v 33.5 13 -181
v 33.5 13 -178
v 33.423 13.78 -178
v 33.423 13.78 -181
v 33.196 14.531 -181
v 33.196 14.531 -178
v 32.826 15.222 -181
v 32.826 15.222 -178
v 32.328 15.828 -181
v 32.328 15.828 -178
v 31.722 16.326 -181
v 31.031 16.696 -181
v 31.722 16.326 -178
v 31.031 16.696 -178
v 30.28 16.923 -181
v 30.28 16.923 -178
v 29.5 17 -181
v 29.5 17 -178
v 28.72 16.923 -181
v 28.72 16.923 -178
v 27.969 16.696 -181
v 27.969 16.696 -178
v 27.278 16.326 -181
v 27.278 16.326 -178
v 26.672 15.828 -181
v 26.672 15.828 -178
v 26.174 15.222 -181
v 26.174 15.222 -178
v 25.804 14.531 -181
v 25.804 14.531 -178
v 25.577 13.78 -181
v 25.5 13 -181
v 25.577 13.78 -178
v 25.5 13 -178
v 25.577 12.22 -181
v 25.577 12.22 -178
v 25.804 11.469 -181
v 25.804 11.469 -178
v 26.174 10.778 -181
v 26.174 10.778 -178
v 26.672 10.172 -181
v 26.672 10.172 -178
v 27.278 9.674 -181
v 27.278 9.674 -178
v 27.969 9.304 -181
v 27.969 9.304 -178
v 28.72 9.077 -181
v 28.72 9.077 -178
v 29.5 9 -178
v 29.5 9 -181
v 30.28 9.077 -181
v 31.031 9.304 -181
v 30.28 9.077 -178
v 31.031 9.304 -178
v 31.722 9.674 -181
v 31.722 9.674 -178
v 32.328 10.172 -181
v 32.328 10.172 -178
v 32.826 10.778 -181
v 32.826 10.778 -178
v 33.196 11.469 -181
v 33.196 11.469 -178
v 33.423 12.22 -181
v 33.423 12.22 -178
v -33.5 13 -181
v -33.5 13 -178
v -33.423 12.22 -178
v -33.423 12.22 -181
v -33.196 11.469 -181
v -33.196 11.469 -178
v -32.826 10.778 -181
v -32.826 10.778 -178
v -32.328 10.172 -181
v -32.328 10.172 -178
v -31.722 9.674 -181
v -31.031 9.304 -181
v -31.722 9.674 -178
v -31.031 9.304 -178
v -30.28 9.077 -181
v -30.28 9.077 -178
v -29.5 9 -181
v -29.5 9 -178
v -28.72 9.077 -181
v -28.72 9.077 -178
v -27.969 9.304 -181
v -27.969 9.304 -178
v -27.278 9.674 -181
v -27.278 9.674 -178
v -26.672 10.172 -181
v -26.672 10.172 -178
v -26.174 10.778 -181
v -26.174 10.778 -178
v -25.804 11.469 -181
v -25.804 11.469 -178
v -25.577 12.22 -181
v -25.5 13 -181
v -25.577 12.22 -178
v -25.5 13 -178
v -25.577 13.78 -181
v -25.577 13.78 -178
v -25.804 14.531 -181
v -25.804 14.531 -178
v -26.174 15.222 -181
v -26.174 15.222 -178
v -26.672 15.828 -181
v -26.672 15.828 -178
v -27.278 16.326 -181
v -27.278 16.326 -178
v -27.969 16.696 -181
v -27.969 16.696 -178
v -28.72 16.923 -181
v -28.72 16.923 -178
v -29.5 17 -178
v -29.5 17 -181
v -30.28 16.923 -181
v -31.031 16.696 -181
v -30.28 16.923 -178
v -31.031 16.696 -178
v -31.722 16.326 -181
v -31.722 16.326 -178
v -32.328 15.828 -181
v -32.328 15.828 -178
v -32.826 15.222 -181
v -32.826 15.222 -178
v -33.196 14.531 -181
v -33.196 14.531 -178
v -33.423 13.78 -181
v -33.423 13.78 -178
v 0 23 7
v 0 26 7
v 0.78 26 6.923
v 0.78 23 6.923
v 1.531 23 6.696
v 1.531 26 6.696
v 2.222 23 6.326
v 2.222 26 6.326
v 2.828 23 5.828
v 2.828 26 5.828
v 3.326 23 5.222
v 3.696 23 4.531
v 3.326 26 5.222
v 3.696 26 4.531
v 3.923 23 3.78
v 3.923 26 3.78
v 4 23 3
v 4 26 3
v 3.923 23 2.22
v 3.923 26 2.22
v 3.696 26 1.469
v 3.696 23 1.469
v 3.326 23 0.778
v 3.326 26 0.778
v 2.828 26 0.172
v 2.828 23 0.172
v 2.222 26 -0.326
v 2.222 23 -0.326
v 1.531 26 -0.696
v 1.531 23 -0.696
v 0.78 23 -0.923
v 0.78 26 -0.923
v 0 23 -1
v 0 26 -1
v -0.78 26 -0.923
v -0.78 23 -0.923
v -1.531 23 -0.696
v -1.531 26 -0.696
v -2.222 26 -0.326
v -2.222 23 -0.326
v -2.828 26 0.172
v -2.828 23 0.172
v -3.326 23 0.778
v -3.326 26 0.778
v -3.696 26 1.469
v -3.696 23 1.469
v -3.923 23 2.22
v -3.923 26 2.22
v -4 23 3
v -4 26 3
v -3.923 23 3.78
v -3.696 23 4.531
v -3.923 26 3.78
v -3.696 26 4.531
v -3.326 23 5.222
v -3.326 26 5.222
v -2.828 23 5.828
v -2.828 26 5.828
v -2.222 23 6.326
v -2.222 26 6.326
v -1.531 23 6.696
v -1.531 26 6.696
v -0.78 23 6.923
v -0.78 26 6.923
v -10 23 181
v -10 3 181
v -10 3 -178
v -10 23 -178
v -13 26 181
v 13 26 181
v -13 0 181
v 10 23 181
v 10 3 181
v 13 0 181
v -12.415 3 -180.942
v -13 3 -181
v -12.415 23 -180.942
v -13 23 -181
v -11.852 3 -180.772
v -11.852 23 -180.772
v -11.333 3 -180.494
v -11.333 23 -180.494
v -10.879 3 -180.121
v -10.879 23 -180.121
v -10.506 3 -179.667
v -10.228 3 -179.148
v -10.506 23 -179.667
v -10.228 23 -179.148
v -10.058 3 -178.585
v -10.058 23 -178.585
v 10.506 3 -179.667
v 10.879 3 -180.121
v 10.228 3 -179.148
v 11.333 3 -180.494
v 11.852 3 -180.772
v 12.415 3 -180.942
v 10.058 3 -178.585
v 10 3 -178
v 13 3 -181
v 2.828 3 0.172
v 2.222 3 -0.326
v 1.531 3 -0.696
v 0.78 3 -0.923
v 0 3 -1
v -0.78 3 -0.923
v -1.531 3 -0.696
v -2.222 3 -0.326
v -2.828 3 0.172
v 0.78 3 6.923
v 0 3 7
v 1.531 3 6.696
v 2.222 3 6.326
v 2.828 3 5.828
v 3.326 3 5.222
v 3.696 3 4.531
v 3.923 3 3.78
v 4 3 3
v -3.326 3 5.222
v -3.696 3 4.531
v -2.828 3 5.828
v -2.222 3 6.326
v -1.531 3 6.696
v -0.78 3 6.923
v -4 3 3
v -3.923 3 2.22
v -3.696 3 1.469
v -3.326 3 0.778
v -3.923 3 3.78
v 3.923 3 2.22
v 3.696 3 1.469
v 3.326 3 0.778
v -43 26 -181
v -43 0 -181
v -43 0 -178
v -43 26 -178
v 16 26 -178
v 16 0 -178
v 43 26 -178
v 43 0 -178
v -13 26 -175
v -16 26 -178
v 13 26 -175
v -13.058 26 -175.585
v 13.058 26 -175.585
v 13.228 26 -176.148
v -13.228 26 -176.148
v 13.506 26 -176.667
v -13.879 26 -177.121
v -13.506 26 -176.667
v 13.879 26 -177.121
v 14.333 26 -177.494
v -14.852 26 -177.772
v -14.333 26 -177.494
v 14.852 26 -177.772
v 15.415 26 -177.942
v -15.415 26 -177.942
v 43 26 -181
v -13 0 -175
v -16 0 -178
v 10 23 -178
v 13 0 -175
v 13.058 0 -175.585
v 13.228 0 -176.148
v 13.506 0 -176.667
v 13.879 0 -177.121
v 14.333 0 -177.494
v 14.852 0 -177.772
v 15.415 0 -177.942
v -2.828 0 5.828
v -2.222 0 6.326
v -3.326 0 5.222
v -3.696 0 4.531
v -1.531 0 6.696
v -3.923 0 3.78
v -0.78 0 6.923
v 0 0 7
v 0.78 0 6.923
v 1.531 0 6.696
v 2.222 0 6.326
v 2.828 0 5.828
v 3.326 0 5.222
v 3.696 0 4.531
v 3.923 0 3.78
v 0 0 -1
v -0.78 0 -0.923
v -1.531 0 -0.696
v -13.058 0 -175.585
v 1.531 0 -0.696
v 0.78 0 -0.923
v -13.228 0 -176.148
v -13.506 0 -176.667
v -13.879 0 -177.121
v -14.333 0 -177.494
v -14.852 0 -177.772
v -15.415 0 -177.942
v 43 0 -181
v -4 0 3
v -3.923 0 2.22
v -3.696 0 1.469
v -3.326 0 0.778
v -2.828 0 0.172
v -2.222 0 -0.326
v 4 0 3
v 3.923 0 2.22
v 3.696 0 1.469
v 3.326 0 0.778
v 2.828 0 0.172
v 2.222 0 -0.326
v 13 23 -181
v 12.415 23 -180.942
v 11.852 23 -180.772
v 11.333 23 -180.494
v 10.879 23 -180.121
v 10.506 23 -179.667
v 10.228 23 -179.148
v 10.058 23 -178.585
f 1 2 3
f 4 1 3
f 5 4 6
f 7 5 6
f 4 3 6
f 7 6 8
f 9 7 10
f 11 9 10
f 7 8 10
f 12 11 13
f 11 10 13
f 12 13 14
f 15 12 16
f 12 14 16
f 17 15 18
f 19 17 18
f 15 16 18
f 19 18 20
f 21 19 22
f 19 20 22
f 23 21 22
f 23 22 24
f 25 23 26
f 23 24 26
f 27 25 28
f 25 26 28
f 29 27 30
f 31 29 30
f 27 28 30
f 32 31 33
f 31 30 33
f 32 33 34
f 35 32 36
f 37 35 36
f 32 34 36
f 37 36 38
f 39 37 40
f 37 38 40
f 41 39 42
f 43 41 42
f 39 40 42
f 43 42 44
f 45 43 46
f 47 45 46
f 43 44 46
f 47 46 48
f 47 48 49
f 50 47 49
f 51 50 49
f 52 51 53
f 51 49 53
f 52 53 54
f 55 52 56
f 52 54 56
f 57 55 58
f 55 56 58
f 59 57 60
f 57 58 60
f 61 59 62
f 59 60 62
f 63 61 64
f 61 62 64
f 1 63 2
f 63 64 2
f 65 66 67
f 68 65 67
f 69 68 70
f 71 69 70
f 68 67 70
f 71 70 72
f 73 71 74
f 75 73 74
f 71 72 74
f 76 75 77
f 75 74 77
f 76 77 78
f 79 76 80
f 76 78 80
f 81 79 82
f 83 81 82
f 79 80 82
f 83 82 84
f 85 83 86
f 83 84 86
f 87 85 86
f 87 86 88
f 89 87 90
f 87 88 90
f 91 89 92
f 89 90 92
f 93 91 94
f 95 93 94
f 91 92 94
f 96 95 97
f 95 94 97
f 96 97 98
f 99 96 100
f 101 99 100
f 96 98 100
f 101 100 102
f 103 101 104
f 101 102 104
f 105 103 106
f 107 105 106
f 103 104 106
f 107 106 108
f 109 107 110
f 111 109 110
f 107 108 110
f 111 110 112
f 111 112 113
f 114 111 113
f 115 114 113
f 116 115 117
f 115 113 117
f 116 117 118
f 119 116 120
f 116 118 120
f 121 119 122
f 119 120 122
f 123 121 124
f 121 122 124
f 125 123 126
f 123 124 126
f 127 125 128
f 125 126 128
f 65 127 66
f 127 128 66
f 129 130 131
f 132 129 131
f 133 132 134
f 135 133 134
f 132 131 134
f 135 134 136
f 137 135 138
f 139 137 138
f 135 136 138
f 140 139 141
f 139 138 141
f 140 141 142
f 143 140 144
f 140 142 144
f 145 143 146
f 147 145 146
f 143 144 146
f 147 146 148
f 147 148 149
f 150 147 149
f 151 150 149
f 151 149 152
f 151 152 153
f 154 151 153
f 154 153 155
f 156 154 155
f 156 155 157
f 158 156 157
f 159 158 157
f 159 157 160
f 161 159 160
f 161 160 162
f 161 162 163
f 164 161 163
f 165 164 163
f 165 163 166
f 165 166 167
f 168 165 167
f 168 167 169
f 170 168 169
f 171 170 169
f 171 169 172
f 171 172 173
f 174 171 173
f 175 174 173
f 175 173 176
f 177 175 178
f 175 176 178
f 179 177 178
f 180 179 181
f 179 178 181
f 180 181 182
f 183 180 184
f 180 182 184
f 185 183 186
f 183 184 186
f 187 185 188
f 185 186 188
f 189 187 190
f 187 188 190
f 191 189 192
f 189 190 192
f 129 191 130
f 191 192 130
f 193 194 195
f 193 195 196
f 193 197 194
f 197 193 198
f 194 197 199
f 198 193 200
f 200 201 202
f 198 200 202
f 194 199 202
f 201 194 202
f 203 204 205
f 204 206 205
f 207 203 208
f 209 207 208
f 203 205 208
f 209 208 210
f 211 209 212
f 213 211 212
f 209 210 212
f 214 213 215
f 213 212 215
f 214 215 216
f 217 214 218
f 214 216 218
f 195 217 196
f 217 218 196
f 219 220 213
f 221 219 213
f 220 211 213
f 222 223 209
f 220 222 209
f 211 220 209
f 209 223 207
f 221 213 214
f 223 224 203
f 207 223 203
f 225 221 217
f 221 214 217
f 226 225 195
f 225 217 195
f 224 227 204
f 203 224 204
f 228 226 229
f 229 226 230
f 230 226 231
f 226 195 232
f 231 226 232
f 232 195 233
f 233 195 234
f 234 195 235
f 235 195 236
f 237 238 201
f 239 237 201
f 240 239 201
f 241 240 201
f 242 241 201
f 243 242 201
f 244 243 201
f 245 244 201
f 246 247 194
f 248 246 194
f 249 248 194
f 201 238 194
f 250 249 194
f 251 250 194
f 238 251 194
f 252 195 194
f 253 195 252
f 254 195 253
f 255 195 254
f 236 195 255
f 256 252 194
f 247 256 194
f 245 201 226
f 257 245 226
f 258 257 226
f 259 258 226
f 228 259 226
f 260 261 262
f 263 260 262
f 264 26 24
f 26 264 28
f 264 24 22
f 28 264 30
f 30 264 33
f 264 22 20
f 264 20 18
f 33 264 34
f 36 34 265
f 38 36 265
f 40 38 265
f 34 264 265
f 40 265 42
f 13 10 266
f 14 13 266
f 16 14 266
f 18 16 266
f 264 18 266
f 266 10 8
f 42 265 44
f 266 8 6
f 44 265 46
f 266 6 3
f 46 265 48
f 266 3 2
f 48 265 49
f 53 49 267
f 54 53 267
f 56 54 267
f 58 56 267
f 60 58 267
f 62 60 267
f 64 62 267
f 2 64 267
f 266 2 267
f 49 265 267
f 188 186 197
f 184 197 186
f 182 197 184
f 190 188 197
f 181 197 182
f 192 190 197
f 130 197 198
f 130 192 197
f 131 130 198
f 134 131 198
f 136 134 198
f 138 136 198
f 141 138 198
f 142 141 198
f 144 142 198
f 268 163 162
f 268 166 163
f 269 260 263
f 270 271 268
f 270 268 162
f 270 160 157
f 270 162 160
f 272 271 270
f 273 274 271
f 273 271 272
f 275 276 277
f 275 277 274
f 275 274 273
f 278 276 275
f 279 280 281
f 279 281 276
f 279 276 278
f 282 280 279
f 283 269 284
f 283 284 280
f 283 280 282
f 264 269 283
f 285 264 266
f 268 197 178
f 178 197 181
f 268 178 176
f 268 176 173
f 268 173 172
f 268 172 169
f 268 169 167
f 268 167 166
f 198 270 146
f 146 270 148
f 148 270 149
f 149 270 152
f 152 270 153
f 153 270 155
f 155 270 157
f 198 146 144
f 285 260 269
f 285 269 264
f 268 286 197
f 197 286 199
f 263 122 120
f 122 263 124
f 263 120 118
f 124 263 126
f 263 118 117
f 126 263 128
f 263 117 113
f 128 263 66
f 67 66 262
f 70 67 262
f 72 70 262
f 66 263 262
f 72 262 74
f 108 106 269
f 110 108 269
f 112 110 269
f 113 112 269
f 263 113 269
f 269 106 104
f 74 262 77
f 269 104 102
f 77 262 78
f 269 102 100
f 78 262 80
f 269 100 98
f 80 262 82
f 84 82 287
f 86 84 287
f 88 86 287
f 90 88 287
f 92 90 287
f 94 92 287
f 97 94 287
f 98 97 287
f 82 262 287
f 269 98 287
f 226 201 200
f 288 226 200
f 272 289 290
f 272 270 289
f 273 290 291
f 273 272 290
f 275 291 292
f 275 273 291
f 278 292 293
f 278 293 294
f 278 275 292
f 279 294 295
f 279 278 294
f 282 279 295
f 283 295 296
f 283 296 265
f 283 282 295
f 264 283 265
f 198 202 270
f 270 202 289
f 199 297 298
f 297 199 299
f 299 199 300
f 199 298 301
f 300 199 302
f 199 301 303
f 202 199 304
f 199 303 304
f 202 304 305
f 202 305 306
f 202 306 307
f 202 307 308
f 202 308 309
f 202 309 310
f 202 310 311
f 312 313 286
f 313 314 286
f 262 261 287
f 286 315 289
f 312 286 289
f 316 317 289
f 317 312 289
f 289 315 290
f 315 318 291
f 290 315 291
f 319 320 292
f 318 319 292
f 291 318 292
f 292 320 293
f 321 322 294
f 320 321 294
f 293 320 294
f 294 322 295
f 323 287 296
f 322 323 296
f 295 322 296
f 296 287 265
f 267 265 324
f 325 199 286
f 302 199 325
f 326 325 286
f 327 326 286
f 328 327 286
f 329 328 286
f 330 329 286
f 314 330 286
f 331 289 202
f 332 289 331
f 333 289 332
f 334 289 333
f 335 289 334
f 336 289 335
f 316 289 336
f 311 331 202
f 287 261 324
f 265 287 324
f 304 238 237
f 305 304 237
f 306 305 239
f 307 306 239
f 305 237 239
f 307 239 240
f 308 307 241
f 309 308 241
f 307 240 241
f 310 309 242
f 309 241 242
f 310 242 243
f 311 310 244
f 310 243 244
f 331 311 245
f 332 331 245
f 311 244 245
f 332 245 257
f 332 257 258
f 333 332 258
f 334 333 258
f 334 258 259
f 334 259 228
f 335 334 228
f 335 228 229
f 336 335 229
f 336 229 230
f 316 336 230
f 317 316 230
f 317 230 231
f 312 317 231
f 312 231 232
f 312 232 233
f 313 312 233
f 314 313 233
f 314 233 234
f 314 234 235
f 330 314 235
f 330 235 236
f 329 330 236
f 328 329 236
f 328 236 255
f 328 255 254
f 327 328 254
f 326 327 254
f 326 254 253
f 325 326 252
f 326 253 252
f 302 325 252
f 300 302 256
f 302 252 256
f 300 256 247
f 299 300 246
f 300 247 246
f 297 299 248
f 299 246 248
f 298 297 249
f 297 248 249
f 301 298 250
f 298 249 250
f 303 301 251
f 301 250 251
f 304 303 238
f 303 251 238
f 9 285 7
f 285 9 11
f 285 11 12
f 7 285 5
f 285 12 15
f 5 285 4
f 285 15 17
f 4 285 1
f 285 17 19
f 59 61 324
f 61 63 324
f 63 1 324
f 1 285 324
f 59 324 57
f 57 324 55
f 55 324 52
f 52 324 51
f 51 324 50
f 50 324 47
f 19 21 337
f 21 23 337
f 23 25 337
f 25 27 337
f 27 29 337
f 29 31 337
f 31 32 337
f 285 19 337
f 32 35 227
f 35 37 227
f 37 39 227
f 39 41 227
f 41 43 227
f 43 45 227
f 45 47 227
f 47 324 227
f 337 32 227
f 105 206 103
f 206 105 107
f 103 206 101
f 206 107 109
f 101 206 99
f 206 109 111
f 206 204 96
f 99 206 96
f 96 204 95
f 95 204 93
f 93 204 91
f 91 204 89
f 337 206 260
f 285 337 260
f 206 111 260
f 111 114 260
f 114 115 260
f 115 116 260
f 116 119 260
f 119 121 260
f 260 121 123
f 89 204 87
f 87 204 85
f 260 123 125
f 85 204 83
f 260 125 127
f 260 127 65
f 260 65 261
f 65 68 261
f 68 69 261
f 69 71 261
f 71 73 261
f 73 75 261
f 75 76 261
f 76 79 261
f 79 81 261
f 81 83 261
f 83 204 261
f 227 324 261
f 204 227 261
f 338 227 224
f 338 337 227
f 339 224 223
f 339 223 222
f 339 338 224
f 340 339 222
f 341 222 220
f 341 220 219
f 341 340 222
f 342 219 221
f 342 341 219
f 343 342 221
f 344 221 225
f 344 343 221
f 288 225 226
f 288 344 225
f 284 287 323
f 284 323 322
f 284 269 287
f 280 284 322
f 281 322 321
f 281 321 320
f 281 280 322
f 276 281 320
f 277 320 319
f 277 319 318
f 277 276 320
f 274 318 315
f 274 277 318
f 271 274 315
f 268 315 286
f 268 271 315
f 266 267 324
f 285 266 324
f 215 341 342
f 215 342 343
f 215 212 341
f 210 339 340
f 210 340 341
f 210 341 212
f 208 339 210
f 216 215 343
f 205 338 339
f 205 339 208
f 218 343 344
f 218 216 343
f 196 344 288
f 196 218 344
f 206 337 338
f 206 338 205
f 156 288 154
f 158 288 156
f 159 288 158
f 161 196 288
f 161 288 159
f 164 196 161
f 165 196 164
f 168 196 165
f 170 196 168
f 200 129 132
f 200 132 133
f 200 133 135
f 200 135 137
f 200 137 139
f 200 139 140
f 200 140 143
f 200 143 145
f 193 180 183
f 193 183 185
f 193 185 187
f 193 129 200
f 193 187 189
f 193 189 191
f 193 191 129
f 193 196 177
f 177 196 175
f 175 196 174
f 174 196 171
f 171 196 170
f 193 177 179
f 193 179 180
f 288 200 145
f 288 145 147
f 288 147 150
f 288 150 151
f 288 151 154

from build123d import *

# Parameters (mm, degrees)
BOSS_EXTRUDE1_DEPTH = 26
SHELL1_START        = -10
SHELL1_OUTLINE_W    = 20
SHELL1_OUTLINE_H    = 362
SHELL1_DEPTH        = 20
FILLET1_R           = 3
SKETCH3_R           = 4
CUT_EXTRUDE1_DEPTH  = 3
SKETCH4_R           = 4
CUT_EXTRUDE2_DEPTH  = 37


# Read off the part's stored shape, not the designer's step: Shell1
with BuildPart() as part:
    # Sketch2 → Boss-Extrude1 (new body)
    with BuildSketch(Plane(origin=(0, 0, 0), x_dir=(1, 0, 0), z_dir=(0, 1, 0))):
        Polygon((-13, 181), (-43, 181), (-43, 178), (-13, 178), (-13, -181), (13, -181), (13, 178), (43, 178), (43, 181), (13, 181), align=None)
    extrude(amount=BOSS_EXTRUDE1_DEPTH)

    # Shell1 outline → Shell1 (cut)
    with BuildSketch(Plane.YZ.offset(SHELL1_START)):
        with Locations((13, 0)):
            Rectangle(SHELL1_OUTLINE_W, SHELL1_OUTLINE_H)
    extrude(amount=SHELL1_DEPTH, mode=Mode.SUBTRACT)

    # Fillet1
    fillet1_edges = [part.edges().sort_by_distance(p)[0] for p in [
        (-13, 13, -178),
        (13, 13, -178),
        (10, 13, -181),
        (-10, 13, -181),
    ]]
    fillet(fillet1_edges, radius=FILLET1_R)

    # Sketch3 → Cut-Extrude1 (cut)
    with BuildSketch(Plane.XY.offset(-178)):
        with Locations((29.5, 13)):
            Circle(SKETCH3_R)
        with Locations(Location((-29.5, 13, 0), (0, 0, 180))):
            Circle(SKETCH3_R)
    extrude(amount=-CUT_EXTRUDE1_DEPTH, mode=Mode.SUBTRACT)

    # Sketch4 → Cut-Extrude2 (cut)
    with BuildSketch(Plane(origin=(0, 26, 0), x_dir=(1, 0, 0), z_dir=(0, 1, 0))):
        with Locations(Location((0, -3, 0), (0, 0, 270))):
            Circle(SKETCH4_R)
    extrude(amount=-CUT_EXTRUDE2_DEPTH, mode=Mode.SUBTRACT)


solid = part.part
